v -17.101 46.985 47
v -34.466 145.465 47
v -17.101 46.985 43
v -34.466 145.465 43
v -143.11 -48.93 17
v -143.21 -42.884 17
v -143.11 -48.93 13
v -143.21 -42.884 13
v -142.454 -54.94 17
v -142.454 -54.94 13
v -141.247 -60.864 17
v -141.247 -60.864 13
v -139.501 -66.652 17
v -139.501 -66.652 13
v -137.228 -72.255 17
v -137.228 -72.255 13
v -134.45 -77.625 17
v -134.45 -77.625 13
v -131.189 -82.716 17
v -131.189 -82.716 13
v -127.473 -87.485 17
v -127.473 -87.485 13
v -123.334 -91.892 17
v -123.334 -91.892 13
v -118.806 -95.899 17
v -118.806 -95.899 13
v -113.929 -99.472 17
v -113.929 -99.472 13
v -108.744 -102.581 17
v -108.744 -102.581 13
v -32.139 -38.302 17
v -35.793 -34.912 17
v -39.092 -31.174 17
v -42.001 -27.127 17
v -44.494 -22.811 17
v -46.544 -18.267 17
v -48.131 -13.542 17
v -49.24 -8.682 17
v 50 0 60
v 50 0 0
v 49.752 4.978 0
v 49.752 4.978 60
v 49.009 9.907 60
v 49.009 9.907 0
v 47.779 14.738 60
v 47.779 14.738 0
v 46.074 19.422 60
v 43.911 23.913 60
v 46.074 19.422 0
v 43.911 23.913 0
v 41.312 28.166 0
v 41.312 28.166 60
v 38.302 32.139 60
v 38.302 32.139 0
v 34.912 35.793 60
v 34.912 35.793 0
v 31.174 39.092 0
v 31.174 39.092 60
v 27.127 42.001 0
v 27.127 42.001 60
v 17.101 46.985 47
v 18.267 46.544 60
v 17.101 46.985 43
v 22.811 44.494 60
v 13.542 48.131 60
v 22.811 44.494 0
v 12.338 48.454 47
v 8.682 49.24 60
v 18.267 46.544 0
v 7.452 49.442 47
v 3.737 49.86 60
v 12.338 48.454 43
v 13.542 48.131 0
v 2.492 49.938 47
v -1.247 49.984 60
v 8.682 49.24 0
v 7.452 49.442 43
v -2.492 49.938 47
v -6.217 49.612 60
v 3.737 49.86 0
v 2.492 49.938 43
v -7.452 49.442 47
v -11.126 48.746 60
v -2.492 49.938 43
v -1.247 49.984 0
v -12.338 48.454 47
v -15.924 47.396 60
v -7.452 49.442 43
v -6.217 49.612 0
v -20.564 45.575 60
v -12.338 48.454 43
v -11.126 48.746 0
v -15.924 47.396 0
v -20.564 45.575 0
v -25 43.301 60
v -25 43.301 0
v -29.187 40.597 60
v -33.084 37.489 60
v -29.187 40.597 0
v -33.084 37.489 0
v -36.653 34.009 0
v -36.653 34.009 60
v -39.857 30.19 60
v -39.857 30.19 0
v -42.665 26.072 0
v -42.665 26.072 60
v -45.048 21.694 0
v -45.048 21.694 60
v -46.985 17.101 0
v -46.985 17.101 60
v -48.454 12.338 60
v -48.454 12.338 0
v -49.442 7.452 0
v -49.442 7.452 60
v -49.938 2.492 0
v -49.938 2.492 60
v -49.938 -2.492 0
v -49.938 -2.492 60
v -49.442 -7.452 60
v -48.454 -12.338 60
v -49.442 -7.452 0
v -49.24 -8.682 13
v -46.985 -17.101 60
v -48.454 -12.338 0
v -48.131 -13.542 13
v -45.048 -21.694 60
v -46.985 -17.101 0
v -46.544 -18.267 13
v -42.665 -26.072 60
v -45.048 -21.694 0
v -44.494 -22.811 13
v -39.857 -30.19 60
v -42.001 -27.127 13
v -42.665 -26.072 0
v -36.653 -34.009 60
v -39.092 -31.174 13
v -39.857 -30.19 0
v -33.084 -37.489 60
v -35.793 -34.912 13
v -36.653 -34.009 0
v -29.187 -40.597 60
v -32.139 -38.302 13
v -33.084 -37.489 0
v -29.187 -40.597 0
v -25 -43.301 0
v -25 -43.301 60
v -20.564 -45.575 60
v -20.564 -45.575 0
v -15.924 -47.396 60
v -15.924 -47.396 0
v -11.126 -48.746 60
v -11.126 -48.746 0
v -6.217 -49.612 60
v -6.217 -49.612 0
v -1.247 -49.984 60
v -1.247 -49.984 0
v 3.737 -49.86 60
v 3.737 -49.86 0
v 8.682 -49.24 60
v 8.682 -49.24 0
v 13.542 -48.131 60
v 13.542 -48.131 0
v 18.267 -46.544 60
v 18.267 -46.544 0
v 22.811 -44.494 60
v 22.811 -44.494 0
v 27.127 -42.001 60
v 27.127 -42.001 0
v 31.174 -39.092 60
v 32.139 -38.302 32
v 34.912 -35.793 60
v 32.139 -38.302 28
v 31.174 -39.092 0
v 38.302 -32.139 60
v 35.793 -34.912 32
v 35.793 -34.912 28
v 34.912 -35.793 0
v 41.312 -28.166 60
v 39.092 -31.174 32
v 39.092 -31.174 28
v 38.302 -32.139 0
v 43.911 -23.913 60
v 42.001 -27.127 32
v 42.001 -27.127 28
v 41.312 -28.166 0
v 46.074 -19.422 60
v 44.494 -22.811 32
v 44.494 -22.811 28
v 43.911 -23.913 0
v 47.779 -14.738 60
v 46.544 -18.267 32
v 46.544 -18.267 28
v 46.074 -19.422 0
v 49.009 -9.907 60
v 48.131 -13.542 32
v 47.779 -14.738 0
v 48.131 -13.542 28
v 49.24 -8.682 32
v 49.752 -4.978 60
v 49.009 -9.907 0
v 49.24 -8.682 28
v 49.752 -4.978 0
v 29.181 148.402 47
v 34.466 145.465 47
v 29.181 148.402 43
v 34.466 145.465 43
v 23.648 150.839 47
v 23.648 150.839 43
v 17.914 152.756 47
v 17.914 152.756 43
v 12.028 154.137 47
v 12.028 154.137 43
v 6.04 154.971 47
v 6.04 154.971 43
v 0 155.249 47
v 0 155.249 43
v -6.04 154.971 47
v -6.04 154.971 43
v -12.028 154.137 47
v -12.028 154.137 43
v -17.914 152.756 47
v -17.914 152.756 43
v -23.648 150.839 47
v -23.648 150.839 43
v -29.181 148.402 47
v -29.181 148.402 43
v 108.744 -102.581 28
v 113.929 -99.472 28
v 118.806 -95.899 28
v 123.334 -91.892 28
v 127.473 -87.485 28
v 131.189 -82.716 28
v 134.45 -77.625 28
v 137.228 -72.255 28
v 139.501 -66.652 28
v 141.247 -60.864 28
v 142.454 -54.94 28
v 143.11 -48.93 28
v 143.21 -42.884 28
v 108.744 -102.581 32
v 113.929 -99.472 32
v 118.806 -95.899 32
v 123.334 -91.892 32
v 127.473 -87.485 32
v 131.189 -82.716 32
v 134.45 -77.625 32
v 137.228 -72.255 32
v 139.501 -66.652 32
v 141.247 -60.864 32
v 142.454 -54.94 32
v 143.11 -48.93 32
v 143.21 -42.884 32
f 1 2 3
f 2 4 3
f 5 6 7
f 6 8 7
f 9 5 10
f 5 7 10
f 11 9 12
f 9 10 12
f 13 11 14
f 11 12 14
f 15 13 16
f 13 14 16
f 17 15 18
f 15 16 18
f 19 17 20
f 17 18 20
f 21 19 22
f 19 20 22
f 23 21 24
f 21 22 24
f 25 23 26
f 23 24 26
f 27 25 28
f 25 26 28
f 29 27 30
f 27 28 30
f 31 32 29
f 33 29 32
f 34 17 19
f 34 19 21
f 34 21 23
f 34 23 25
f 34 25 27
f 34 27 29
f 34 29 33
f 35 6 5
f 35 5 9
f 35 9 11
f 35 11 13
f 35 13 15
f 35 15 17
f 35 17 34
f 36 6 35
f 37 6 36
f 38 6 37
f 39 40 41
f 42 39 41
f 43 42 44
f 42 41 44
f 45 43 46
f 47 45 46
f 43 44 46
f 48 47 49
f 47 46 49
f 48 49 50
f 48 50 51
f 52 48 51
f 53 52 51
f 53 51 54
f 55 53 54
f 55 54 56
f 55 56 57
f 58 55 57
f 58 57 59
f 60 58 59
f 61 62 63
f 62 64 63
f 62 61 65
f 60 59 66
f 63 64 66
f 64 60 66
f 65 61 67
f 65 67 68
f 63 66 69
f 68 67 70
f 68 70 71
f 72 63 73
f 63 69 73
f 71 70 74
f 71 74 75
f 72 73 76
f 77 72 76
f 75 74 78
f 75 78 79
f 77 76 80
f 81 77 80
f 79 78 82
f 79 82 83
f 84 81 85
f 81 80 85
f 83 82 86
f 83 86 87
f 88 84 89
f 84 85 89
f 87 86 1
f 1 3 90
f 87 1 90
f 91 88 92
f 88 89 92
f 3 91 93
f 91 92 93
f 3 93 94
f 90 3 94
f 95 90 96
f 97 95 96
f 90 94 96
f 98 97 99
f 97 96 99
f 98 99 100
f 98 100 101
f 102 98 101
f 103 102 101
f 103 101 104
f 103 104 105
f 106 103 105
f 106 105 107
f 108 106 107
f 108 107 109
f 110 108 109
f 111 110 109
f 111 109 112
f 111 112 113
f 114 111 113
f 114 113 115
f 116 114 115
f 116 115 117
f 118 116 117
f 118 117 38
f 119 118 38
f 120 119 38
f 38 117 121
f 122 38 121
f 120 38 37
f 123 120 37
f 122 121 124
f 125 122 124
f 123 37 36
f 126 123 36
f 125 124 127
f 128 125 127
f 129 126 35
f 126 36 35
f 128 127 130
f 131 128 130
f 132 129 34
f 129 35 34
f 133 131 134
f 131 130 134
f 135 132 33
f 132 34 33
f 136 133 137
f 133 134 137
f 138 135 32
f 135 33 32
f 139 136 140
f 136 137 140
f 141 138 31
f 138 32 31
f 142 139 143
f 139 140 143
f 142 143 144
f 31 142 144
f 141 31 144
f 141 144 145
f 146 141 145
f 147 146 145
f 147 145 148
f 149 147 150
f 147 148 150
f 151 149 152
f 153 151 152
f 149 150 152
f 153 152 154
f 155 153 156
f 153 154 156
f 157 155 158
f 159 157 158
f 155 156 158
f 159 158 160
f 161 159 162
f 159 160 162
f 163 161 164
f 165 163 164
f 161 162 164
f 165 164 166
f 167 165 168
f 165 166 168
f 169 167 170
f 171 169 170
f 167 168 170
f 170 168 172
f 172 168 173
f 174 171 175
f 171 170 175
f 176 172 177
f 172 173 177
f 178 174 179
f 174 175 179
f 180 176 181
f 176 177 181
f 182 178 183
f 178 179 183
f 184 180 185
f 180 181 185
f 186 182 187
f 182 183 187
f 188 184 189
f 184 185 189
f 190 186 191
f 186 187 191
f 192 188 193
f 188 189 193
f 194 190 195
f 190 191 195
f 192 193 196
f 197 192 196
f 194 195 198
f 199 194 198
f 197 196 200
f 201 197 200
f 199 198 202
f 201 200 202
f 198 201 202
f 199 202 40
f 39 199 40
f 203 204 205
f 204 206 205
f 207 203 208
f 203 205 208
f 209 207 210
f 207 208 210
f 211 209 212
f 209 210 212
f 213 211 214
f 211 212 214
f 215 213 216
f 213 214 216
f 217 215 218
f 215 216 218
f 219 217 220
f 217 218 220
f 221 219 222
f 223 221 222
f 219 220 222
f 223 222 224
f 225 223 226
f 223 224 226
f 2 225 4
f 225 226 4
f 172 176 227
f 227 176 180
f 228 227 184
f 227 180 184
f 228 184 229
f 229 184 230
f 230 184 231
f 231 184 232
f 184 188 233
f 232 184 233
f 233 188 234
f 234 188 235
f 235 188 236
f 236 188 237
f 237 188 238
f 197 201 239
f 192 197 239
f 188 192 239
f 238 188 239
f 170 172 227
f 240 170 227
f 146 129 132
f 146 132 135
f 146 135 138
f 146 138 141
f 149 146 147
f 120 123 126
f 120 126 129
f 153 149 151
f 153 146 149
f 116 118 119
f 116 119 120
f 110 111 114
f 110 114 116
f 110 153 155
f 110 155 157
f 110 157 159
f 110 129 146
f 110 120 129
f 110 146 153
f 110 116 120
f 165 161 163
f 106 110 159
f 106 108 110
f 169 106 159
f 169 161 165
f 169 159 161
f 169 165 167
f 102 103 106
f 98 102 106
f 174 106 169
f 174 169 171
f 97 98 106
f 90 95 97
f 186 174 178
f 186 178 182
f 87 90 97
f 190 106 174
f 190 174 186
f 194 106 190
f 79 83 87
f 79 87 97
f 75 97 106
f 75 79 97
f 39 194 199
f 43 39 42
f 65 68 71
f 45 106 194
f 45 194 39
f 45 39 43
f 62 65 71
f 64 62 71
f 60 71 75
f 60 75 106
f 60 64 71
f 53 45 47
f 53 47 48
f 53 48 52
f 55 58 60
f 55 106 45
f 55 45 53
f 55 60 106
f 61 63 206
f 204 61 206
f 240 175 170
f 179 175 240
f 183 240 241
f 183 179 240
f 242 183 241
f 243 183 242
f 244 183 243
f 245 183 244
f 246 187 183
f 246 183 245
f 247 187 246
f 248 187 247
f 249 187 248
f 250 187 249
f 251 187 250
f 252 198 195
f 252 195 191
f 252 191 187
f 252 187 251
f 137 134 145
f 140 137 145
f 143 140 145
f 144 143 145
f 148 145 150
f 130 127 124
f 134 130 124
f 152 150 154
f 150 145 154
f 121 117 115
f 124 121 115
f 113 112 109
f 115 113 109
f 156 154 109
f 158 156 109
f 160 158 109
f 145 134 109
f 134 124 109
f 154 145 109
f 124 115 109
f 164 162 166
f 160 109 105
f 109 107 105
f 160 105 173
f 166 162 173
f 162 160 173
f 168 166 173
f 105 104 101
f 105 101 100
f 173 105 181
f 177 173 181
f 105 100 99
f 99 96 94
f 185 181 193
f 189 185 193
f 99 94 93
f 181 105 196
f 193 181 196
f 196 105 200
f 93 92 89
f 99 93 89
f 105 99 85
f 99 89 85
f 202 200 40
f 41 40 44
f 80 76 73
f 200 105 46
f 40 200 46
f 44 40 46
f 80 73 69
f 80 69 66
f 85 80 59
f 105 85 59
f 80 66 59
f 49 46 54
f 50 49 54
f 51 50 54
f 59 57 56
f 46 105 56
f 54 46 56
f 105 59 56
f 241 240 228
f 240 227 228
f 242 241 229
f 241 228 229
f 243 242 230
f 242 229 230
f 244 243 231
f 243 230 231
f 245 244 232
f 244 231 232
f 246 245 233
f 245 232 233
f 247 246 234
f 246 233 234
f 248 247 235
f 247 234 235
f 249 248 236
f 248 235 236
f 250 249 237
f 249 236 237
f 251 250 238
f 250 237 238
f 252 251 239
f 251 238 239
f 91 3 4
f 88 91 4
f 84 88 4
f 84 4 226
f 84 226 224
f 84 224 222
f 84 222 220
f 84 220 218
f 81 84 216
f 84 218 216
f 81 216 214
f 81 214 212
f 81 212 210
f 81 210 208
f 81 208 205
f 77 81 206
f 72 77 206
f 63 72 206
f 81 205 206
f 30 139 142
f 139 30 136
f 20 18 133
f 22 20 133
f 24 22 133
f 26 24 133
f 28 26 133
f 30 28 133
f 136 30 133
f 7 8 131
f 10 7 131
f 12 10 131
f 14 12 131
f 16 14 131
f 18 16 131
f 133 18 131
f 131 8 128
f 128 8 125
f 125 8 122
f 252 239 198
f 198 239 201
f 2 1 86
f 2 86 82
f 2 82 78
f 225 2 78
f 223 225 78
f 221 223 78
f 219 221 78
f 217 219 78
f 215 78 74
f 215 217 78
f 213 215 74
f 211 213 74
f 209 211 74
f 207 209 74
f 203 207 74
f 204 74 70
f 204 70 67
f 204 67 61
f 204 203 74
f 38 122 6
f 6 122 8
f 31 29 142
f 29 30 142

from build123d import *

# Parameters (mm, degrees)
SKETCH1_R           = 50
BOSS_EXTRUDE1_DEPTH = 60
BOSS_EXTRUDE4_DEPTH = 2
BOSS_EXTRUDE5_DEPTH = 2
BOSS_EXTRUDE6_DEPTH = 2


with BuildPart() as part:
    # Sketch1 → Boss-Extrude1 (new body)
    with BuildSketch(Plane.XY):
        Circle(SKETCH1_R)
    extrude(amount=BOSS_EXTRUDE1_DEPTH)

    # Sketch4 → Boss-Extrude4 (add, symmetric)
    with BuildSketch(Plane(origin=(0, 0, 45), x_dir=(-1, 0, 0), z_dir=(0, 0, -1))):
        with BuildLine():
            Line((-17.101007166, 46.984631039), (-34.465824933, 145.465406341))
            ThreePointArc((-34.465824933, 145.465406341), (0, 155.249311955), (34.465824933, 145.465406341))
            Line((34.465824933, 145.465406341), (17.101007166, 46.984631039))
            ThreePointArc((17.101007166, 46.984631039), (0, 50), (-17.101007166, 46.984631039))
        make_face()
    extrude(amount=BOSS_EXTRUDE4_DEPTH, both=True)

    # Sketch5 → Boss-Extrude5 (add, symmetric)
    with BuildSketch(Plane(origin=(0, 0, 30), x_dir=(-1, 0, 0), z_dir=(0, 0, -1))):
        with BuildLine():
            Line((-32.139380484, -38.302222156), (-108.743824796, -102.580983125))
            ThreePointArc((-108.743824796, -102.580983125), (-134.449848073, -77.624655977), (-143.209649729, -42.884423216))
            Line((-143.209649729, -42.884423216), (-49.240387651, -8.682408883))
            ThreePointArc((-49.240387651, -8.682408883), (-43.301270189, -25), (-32.139380484, -38.302222156))
        make_face()
    extrude(amount=BOSS_EXTRUDE5_DEPTH, both=True)

    # Sketch6 → Boss-Extrude6 (add, symmetric)
    with BuildSketch(Plane(origin=(0, 0, 15), x_dir=(-1, 0, 0), z_dir=(0, 0, -1))):
        with BuildLine():
            Line((49.240387651, -8.682408883), (143.209649729, -42.884423216))
            ThreePointArc((143.209649729, -42.884423216), (134.449848073, -77.624655977), (108.743824796, -102.580983125))
            Line((108.743824796, -102.580983125), (32.139380484, -38.302222156))
            ThreePointArc((32.139380484, -38.302222156), (43.301270189, -25), (49.240387651, -8.682408883))
        make_face()
    extrude(amount=BOSS_EXTRUDE6_DEPTH, both=True)


solid = part.part
